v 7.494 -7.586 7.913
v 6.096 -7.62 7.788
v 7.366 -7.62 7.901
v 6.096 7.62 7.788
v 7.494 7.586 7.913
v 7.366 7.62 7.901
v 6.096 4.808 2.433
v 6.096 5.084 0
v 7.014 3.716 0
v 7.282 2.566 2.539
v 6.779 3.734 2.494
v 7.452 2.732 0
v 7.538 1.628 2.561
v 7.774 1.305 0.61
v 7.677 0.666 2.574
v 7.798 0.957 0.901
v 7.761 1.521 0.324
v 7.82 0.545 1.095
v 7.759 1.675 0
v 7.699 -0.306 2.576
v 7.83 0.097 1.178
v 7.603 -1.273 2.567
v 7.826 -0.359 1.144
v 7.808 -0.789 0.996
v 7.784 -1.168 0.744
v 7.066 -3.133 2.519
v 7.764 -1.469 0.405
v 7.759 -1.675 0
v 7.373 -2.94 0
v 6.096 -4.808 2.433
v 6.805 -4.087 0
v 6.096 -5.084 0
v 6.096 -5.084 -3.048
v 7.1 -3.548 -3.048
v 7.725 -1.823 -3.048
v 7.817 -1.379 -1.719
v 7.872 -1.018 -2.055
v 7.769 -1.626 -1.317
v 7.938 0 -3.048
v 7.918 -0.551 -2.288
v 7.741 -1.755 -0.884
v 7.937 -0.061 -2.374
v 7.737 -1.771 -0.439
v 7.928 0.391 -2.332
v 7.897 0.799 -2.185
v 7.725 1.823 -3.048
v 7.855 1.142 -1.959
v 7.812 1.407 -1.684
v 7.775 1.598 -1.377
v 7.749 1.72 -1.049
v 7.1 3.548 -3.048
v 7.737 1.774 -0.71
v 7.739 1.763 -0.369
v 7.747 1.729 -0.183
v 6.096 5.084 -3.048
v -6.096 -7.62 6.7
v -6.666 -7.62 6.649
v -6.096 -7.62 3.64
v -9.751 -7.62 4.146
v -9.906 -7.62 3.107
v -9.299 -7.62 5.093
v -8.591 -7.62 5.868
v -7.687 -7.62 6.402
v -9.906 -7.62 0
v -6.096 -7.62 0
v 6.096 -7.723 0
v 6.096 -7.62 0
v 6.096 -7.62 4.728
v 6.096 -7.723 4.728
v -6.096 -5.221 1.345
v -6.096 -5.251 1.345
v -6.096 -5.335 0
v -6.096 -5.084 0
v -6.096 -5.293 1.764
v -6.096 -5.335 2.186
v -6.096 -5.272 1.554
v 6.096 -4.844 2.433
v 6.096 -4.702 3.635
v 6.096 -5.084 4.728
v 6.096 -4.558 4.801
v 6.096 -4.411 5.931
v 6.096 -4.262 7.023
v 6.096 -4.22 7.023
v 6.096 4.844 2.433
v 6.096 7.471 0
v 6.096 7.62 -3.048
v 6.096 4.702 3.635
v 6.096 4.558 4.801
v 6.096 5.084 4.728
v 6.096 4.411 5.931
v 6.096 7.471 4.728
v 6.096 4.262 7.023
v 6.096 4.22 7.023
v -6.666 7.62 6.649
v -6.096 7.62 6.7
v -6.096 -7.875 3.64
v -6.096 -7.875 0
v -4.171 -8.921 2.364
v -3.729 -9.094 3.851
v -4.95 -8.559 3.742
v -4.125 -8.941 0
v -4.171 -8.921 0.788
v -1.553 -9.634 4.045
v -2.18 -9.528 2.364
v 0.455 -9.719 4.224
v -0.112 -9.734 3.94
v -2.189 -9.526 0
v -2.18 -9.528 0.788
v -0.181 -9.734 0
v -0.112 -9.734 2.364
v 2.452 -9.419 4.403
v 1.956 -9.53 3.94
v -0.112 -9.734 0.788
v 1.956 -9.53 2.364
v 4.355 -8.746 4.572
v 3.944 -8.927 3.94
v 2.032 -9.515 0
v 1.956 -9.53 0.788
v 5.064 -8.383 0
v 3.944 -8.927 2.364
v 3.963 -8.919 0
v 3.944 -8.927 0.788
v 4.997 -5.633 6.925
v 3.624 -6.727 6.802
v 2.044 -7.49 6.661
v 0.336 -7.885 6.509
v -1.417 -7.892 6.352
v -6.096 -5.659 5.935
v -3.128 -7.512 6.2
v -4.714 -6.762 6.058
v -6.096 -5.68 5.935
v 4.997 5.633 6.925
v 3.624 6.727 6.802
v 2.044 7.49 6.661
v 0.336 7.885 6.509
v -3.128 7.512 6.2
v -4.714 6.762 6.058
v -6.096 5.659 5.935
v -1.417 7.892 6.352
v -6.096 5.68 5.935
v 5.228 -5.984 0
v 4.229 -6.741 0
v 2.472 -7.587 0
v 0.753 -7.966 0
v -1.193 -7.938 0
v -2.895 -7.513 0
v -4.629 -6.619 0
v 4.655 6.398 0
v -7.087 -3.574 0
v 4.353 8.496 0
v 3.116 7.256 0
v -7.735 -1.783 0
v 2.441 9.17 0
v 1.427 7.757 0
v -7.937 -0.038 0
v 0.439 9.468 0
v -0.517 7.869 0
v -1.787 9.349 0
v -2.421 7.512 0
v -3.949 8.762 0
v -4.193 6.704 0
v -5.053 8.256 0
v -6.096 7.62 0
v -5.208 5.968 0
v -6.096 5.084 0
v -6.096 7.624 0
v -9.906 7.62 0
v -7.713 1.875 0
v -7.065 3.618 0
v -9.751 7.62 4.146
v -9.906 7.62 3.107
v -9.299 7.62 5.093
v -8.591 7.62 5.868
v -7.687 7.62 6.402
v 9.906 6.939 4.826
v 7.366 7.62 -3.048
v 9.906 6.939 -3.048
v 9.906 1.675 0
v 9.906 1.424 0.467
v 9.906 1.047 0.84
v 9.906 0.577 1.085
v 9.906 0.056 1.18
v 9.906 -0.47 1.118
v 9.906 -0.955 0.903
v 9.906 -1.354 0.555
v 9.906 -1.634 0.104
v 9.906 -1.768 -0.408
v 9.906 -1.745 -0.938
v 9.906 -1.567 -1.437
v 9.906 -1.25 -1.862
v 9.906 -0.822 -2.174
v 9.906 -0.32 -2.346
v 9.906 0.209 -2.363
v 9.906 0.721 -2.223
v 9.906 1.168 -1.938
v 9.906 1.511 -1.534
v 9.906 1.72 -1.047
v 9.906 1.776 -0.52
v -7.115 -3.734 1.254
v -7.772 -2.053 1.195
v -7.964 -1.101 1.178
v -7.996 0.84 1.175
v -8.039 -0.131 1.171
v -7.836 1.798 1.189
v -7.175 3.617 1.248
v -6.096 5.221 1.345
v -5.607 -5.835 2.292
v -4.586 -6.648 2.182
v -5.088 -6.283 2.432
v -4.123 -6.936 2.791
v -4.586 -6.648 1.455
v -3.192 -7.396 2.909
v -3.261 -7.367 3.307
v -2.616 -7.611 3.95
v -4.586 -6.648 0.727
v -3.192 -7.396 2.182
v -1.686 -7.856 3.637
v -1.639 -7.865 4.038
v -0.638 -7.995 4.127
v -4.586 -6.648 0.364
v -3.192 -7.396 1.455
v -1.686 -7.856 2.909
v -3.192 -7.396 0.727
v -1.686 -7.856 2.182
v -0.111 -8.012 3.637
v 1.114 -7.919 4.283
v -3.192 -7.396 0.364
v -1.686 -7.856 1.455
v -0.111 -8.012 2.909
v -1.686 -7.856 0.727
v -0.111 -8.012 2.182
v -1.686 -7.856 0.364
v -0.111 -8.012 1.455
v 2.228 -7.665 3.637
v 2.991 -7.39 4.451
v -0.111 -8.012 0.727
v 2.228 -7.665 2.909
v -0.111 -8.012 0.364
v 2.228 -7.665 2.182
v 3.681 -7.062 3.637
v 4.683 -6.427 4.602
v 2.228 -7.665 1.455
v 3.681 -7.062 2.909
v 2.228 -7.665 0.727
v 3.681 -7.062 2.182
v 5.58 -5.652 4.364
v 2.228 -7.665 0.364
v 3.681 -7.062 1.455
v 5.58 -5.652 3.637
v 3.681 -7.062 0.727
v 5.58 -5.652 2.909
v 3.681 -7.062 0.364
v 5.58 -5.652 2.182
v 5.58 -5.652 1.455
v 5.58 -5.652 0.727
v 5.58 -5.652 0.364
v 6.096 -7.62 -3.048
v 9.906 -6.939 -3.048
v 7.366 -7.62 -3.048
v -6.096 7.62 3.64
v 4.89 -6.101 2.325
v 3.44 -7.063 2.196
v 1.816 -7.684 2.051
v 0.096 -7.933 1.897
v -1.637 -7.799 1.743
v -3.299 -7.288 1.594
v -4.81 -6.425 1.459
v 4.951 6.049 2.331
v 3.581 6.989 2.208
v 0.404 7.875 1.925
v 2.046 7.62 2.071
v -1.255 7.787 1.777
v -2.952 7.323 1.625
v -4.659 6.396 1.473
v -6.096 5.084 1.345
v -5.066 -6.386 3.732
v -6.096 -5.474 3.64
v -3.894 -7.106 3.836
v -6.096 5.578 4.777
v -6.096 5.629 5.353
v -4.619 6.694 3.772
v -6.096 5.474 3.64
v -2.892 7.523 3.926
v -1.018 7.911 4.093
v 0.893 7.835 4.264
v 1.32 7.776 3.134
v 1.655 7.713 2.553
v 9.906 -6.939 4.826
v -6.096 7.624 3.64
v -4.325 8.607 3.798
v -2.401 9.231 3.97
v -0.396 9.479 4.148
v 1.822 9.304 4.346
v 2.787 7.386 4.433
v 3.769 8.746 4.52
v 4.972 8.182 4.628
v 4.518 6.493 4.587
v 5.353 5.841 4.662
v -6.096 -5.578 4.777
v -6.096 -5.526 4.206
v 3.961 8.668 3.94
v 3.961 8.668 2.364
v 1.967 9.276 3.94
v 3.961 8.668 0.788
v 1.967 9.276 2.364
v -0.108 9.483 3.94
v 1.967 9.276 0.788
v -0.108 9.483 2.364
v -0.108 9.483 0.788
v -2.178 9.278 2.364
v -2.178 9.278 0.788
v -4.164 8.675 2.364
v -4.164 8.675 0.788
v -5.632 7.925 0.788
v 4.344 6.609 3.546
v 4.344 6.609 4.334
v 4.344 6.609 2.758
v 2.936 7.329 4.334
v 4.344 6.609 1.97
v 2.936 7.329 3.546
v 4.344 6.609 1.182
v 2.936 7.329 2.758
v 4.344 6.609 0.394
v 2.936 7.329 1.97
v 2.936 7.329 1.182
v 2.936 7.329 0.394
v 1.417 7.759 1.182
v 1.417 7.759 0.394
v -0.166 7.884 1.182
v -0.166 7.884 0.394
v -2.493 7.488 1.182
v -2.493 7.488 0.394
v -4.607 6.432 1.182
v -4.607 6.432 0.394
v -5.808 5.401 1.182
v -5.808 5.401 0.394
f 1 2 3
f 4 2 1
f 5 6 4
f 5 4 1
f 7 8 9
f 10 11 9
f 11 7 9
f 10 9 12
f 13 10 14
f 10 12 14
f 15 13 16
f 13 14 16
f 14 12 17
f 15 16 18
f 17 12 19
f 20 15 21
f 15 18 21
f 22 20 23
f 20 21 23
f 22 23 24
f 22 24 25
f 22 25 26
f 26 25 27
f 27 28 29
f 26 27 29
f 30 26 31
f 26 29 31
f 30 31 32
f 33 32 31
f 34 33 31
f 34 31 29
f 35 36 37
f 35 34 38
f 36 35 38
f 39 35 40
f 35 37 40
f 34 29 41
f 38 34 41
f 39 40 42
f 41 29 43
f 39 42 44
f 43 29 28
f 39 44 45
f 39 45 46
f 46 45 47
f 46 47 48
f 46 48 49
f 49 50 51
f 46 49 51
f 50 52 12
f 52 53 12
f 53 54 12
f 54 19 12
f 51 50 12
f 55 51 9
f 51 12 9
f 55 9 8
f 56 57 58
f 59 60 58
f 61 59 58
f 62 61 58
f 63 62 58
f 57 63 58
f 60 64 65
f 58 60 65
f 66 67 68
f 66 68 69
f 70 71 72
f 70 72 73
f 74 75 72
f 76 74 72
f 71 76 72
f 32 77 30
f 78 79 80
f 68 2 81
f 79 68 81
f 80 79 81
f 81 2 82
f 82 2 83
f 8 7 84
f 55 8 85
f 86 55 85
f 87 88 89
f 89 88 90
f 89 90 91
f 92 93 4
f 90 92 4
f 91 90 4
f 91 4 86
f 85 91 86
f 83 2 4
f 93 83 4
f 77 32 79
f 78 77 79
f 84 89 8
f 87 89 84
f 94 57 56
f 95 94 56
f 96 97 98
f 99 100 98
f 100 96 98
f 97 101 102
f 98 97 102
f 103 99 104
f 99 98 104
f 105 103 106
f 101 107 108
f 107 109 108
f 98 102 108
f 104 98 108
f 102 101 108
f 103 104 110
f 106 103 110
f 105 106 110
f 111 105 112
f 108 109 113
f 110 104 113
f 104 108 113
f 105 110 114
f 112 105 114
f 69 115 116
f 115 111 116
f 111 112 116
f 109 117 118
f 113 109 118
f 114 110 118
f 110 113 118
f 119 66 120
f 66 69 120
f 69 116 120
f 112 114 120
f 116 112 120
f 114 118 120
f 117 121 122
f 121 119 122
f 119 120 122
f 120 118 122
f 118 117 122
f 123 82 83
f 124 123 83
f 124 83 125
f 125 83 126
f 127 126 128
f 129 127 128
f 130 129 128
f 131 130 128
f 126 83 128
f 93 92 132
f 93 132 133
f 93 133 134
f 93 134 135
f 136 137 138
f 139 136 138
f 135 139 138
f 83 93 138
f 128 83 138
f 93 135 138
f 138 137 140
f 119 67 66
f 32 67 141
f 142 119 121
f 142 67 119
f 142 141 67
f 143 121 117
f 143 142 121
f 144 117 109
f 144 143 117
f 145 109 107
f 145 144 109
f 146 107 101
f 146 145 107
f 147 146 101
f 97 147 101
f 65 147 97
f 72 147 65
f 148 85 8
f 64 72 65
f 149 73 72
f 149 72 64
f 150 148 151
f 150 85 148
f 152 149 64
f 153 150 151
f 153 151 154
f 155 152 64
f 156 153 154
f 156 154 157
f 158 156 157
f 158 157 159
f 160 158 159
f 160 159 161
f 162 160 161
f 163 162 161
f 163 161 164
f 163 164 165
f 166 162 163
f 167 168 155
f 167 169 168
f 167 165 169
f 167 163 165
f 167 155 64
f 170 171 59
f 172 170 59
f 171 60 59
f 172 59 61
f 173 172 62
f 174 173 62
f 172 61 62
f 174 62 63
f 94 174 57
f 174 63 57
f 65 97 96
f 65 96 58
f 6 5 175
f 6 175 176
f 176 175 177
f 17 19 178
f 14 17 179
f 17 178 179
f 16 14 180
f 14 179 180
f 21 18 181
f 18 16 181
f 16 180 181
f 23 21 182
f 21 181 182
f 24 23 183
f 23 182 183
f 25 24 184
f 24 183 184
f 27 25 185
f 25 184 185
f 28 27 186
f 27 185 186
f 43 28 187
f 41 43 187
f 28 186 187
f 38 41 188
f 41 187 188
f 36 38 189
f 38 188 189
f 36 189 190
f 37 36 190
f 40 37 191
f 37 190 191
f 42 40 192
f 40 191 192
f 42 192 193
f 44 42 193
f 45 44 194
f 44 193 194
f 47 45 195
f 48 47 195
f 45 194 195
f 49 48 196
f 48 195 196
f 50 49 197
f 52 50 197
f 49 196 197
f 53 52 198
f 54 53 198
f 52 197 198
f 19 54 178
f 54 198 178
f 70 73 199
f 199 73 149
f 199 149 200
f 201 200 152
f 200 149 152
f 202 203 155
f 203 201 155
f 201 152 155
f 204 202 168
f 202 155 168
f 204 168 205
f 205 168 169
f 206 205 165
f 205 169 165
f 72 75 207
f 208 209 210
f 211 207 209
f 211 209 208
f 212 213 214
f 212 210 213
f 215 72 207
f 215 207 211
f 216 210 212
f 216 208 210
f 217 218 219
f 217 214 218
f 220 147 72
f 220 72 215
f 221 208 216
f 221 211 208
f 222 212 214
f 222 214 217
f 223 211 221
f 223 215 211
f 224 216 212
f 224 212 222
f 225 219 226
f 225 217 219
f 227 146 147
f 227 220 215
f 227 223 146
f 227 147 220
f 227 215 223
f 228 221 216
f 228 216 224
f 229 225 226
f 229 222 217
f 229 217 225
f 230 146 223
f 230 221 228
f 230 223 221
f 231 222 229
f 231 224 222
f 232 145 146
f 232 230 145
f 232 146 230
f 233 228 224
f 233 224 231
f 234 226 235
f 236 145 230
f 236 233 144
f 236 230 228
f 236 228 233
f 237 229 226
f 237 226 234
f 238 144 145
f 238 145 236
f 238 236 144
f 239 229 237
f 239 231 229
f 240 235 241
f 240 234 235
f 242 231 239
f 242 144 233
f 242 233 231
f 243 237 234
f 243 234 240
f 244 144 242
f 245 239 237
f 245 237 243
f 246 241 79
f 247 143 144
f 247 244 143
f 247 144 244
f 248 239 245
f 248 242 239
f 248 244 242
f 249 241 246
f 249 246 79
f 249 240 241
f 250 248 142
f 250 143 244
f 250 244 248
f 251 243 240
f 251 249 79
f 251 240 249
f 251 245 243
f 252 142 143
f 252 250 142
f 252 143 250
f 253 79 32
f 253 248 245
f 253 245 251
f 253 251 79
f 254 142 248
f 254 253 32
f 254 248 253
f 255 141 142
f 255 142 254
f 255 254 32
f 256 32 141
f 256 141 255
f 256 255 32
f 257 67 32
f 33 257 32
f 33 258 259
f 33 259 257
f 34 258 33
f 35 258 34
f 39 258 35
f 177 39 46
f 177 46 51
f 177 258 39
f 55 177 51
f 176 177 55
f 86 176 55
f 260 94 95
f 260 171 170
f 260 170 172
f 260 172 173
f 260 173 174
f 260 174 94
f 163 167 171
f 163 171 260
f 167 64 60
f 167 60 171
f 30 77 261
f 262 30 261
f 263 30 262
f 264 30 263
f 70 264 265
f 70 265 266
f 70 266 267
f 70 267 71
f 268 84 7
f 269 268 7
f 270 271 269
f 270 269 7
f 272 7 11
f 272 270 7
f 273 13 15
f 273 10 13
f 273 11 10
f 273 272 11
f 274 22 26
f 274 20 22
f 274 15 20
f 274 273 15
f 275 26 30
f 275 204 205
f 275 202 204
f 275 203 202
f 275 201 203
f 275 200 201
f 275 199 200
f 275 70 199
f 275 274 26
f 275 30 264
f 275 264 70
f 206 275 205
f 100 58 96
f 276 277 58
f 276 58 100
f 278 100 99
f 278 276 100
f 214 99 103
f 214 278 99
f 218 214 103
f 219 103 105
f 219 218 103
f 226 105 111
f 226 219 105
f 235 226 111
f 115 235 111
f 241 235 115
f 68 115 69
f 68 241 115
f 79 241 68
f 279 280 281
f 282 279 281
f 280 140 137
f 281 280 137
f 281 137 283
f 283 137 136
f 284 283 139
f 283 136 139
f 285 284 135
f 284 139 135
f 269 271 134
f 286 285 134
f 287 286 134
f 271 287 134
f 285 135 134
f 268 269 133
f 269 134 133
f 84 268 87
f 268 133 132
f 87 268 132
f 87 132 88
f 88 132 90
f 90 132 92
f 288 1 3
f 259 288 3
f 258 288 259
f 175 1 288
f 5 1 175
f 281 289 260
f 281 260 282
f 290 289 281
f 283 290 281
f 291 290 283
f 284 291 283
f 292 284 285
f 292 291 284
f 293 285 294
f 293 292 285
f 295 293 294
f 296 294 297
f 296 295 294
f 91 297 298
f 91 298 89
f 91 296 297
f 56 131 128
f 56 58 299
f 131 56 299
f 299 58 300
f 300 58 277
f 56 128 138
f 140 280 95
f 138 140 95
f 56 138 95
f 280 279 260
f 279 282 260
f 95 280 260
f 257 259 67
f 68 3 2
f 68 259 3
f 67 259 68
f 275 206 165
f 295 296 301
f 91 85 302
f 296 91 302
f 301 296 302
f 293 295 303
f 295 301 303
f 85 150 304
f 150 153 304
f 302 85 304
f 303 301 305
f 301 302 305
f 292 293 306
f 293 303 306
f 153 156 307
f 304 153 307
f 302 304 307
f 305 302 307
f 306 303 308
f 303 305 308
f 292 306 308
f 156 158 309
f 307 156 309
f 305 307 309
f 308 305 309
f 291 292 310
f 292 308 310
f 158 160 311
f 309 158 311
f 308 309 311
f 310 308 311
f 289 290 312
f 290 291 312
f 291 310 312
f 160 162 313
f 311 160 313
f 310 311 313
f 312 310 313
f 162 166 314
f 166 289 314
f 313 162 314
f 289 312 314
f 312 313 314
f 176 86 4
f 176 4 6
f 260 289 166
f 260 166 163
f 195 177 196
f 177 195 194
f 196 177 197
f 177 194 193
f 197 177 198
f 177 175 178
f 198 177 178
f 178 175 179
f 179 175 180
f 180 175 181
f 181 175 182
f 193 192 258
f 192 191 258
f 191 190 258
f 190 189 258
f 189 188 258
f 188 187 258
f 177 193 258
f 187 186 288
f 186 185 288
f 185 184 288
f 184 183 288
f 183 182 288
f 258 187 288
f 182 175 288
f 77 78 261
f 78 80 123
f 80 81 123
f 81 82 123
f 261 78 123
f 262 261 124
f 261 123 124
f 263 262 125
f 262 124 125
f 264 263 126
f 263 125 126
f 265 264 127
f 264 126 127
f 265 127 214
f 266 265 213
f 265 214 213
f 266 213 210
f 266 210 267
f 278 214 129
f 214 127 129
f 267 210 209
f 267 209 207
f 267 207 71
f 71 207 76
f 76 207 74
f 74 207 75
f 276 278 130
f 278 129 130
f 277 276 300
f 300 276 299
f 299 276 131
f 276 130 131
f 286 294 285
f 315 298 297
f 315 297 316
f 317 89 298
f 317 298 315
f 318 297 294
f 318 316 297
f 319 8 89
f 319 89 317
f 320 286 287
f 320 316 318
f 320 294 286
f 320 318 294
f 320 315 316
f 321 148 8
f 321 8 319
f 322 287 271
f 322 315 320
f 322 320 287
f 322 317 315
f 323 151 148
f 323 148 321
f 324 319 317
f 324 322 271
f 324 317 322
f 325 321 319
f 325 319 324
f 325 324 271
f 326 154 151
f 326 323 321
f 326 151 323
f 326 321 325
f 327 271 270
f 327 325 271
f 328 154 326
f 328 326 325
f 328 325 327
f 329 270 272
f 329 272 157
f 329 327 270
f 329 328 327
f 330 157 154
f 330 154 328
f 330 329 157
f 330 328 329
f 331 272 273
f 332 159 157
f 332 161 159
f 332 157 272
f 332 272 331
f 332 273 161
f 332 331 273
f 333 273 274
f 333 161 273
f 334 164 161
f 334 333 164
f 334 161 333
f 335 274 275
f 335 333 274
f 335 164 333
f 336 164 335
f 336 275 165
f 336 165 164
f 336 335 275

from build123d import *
from OCP.BRepFilletAPI import BRepFilletAPI_MakeChamfer

# Parameters (mm, degrees)
SKETCH1_W                         = 3.81
SKETCH1_H                         = 15.24
BOSS_EXTRUDE1_DEPTH               = 8.128
BOSS_EXTRUDE1_2_DEPTH             = 8.128
CUT_EXTRUDE2_DEPTH                = 20.911072799
SKETCH12_R                        = 7.9375
MAGNET_DEPTH                      = 4.572
BOSS_EXTRUDE6_DEPTH               = 3.048
SKETCH14_R                        = 1.778
CUT_EXTRUDE4_DEPTH                = 2.54
CHAMFER3_SIZE                     = 2.54
CHAMFER3_SIZE2                    = 0.680590949
CHAMFER4_SIZE                     = 2.54
CHAMFER4_SIZE2                    = 0.680590949
CHAMFER5_SIZE                     = 3.302
CHAMFER5_SIZE2                    = 2.421231652
BOSS_EXTRUDE7_REACH               = 20.006
BOSS_EXTRUDE7_OFFSET_FROM_SURFACE = 3.048
FILLET1_R                         = 3.556


with BuildPart() as part:
    # Sketch1 → Boss-Extrude1 (new body)
    with BuildSketch(Plane.XY):
        with Locations((-8.001, 0)):
            Rectangle(SKETCH1_W, SKETCH1_H)
    extrude(amount=BOSS_EXTRUDE1_DEPTH)


with BuildPart() as body_2:
    # Sketch1 → Boss-Extrude1 2 (new body)
    with BuildSketch(Plane.XY):
        with Locations((8.001, 0)):
            Rectangle(SKETCH1_W, SKETCH1_H)
    extrude(amount=BOSS_EXTRUDE1_2_DEPTH)


with BuildPart() as cut_extrude2_tool:
    # Sketch6 → Cut-Extrude2 (new, through all)
    with BuildSketch(Plane(origin=(0, 7.62, 0), x_dir=(1, 0, 0), z_dir=(0, 1, 0))):
        Polygon((-9.906, -6.359826106), (9.906, -8.128), (-9.906, -8.128), align=None)
    extrude(amount=-CUT_EXTRUDE2_DEPTH)


with BuildPart() as part_1:
    add(part.part)

    # Cut-Extrude2: cut by cut_extrude2_tool
    add(cut_extrude2_tool.part, mode=Mode.SUBTRACT)

    # Cut-Loft1: read off the stored shape, not the designer's step
    # Cut-Loft1: loft between two sections, ruled curve by curve
    cut_loft1_from = [
        Edge.make_bspline([(-0.341139785, 7.934039191, 6.44843844), (15.401545931, 7.465303163, 7.853435709), (14.936513948, -8.402775219, 7.811932711), (-0.806171769, -7.934039191, 6.406935441), (-16.548857485, -7.465303163, 5.001938171), (-16.083825501, 8.402775219, 5.04344117), (-0.341139785, 7.934039191, 6.44843844)], [0, 0, 0, 0, 0.5, 0.5, 0.5, 1, 1, 1, 1], 3, [1, 0.333333333, 0.333333333, 1, 0.333333333, 0.333333333, 1]),
    ]
    cut_loft1_to = [
        Edge.make_bspline([(-0.164568393, 7.935793816, 0), (15.70701924, 8.264930602, 0), (16.036156025, -7.606657031, 0), (0.164568393, -7.935793816, 0), (-15.70701924, -8.264930602, 0), (-16.036156025, 7.606657031, 0), (-0.164568393, 7.935793816, 0)], [0, 0, 0, 0, 0.5, 0.5, 0.5, 1, 1, 1, 1], 3, [1, 0.333333333, 0.333333333, 1, 0.333333333, 0.333333333, 1]),
    ]
    cut_loft1 = Solid(Shell([*[Face.make_surface_from_curves(cut_loft1_from[k], cut_loft1_to[k]) for k in range(1)], Face(Wire(cut_loft1_from)), Face(Wire(cut_loft1_to))]))
    add(cut_loft1, mode=Mode.SUBTRACT)


with BuildPart() as body_2_1:
    add(body_2.part)

    # Cut-Extrude2: cut by cut_extrude2_tool
    add(cut_extrude2_tool.part, mode=Mode.SUBTRACT)

    # Cut-Loft1 2: loft between two sections, ruled curve by curve
    cut_loft1_2_from = [
        Edge.make_bspline([(-0.341139785, 7.934039191, 6.44843844), (15.401545931, 7.465303163, 7.853435709), (14.936513948, -8.402775219, 7.811932711), (-0.806171769, -7.934039191, 6.406935441), (-16.548857485, -7.465303163, 5.001938171), (-16.083825501, 8.402775219, 5.04344117), (-0.341139785, 7.934039191, 6.44843844)], [0, 0, 0, 0, 0.5, 0.5, 0.5, 1, 1, 1, 1], 3, [1, 0.333333333, 0.333333333, 1, 0.333333333, 0.333333333, 1]),
    ]
    cut_loft1_2_to = [
        Edge.make_bspline([(-0.164568393, 7.935793816, 0), (15.70701924, 8.264930602, 0), (16.036156025, -7.606657031, 0), (0.164568393, -7.935793816, 0), (-15.70701924, -8.264930602, 0), (-16.036156025, 7.606657031, 0), (-0.164568393, 7.935793816, 0)], [0, 0, 0, 0, 0.5, 0.5, 0.5, 1, 1, 1, 1], 3, [1, 0.333333333, 0.333333333, 1, 0.333333333, 0.333333333, 1]),
    ]
    cut_loft1_2 = Solid(Shell([*[Face.make_surface_from_curves(cut_loft1_2_from[k], cut_loft1_2_to[k]) for k in range(1)], Face(Wire(cut_loft1_2_from)), Face(Wire(cut_loft1_2_to))]))
    add(cut_loft1_2, mode=Mode.SUBTRACT)


with BuildPart() as body_3:
    # Sketch12 → Magnet (new body)
    with BuildSketch(Plane(origin=(-0.573655777, 0, 6.42768694), x_dir=(-0.9960410654107703, 0, -0.08889429686643446), z_dir=(0.08889429686643446, 0, -0.9960410654107703))):
        Circle(SKETCH12_R)
    extrude(amount=MAGNET_DEPTH)


with BuildPart() as body_4:
    # Sketch13 → Boss-Extrude6 (new body)
    with BuildSketch(Plane(origin=(0, 0, 0), x_dir=(-1, 0, 0), z_dir=(0, 0, -1))):
        with BuildLine():
            Line((-6.096, 5.08357062), (-6.096, 7.62))
            Line((-6.096, 7.62), (-9.906, 7.62))
            Line((-9.906, 7.62), (-9.906, -7.62))
            Line((-9.906, -7.62), (-6.096, -7.62))
            Line((-6.096, -7.62), (-6.096, -5.08357062))
            ThreePointArc((-6.096, -5.08357062), (-7.9375, 0), (-6.096, 5.08357062))
        make_face()
    extrude(amount=BOSS_EXTRUDE6_DEPTH)


with BuildPart() as cut_extrude4_tool:
    # Sketch14 → Cut-Extrude4 (new body)
    with BuildSketch(Plane(origin=(9.906, 0, 0), x_dir=(0, 0, -1), z_dir=(1, 0, 0))):
        with Locations((0.597062067, -1.1e-08)):
            Circle(SKETCH14_R)
    extrude(amount=-CUT_EXTRUDE4_DEPTH)


with BuildPart() as body_2_2:
    add(body_2_1.part)

    # Cut-Extrude4: cut by cut_extrude4_tool
    add(cut_extrude4_tool.part, mode=Mode.SUBTRACT)

    # Chamfer3: one chamfer whose edges measure the first distance from different faces: ONE call of the kernel's chamfer builder (chamfer() names one face for all edges)
    chamfer3_edges_1 = [body_2_2.edges().sort_by_distance(p)[0] for p in [
        (9.906, -7.62, 4.064),
    ]]
    chamfer3_side_1 = [body_2_2.faces().sort_by_distance(p)[0] for p in [
        (8.014566329, -7.62, 3.979597021),
    ]]
    chamfer3_edges_2 = [body_2_2.edges().sort_by_distance(p)[0] for p in [
        (9.906, 7.62, 4.064),
    ]]
    chamfer3_side_2 = [body_2_2.faces().sort_by_distance(p)[0] for p in [
        (8.014566329, 7.62, 3.979597021),
    ]]
    chamfer3 = BRepFilletAPI_MakeChamfer(body_2_2.part.solid().wrapped)
    for e in chamfer3_edges_1:
        chamfer3.Add(CHAMFER3_SIZE, CHAMFER3_SIZE2, e.wrapped, chamfer3_side_1[0].wrapped)  # the first distance lies on this face
    for e in chamfer3_edges_2:
        chamfer3.Add(CHAMFER3_SIZE, CHAMFER3_SIZE2, e.wrapped, chamfer3_side_2[0].wrapped)  # the first distance lies on this face
    add(Compound.cast(chamfer3.Shape()), mode=Mode.REPLACE)

    # Chamfer5
    chamfer5_edges = [body_2_2.edges().sort_by_distance(p)[0] for p in [
        (9.906, 0, 8.128),
    ]]
    chamfer5_side = [body_2_2.faces().sort_by_distance(p)[0] for p in [
        (9.906, 0, 4.157766254),
    ]]
    chamfer(chamfer5_edges, length=CHAMFER5_SIZE, length2=CHAMFER5_SIZE2, reference=chamfer5_side[0])

    # Boss-Extrude7: up to this face of the body (flat: up to its plane, moved by the offset)
    boss_extrude7_end = Plane(body_2_2.part.faces().sort_by_distance((6.795040928, 0, 7.8503543))[0]).offset(-BOSS_EXTRUDE7_OFFSET_FROM_SURFACE)
    # Sketch15 → Boss-Extrude7 (add, up to the picked face)
    with BuildSketch(Plane.XY, mode=Mode.PRIVATE) as boss_extrude7_sk1:
        with BuildLine():
            Line((6.096, 5.08357062), (6.096, 7.471449808))
            add(Edge.make_bspline(
                [(6.096, 7.471449808), (5.930756217, 7.591123534), (5.255615528, 8.051037173), (3.293003266, 9.079390192), (1.283010021, 9.48240548), (-0.107834445, 9.483073279), (-1.498678912, 9.483741079), (-3.43762918, 9.094971238), (-5.325260948, 8.130204629), (-5.94396227, 7.728072028), (-6.096, 7.623571521)],
                knots=[0.900690867, 0.900690867, 0.900690867, 0.900690867, 0.909893147, 0.9375, 1, 1, 1, 1.0625, 1.087339124, 1.095618826, 1.095618826, 1.095618826, 1.095618826], degree=3))
            Line((-6.096, 7.623571521), (-6.096001081, 5.083571521))
            add(Edge.make_bspline(
                [(6.096, 5.08357062), (5.93161291, 5.274891544), (5.758408134, 5.458513784), (5.199745975, 5.997244915), (4.788453523, 6.323024277), (4.121406265, 6.751856672), (3.889862409, 6.885002693), (3.419802681, 7.125246454), (3.180186729, 7.23314886), (2.447832586, 7.520869047), (1.940077624, 7.665345536), (0.893913787, 7.852965093), (0.366394093, 7.894488776), (-0.165582558, 7.883517088), (-0.697559209, 7.8725454), (-1.219532269, 7.809382621), (-1.988103649, 7.639571774), (-2.241878196, 7.570363771), (-2.744485351, 7.406164502), (-2.993938175, 7.310744438), (-3.718584086, 6.991700252), (-4.175623921, 6.734186385), (-5.038069326, 6.130349805), (-5.444832888, 5.781030811), (-5.906820855, 5.29786321), (-6.002858614, 5.191954979), (-6.096001081, 5.083571521)],
                knots=[0.860122022, 0.860122022, 0.860122022, 0.860122022, 0.875, 0.875, 0.90625, 0.90625, 0.921875, 0.921875, 0.9375, 0.9375, 0.96875, 0.96875, 1, 1, 1, 1.03125, 1.03125, 1.046875, 1.046875, 1.0625, 1.0625, 1.09375, 1.09375, 1.125, 1.125, 1.133513625, 1.133513625, 1.133513625, 1.133513625], degree=3))
        make_face()
    boss_extrude7_tool1 = split(extrude(boss_extrude7_sk1.sketch, amount=BOSS_EXTRUDE7_REACH, mode=Mode.PRIVATE), bisect_by=boss_extrude7_end, keep=Keep.BOTH, mode=Mode.PRIVATE)
    # Sketch15 → Boss-Extrude7 (add, up to the picked face)
    with BuildSketch(Plane.XY, mode=Mode.PRIVATE) as boss_extrude7_sk2:
        with BuildLine():
            add(Edge.make_bspline(
                [(-6.096, -5.334665385), (-6.001608062, -5.440026559), (-5.904161756, -5.543205008), (-5.428535567, -6.020913198), (-5.021324344, -6.355746552), (-4.367831042, -6.794427859), (-4.142640685, -6.930176212), (-3.677224948, -7.180264747), (-3.435889004, -7.294952261), (-2.704038324, -7.599333248), (-2.202060233, -7.75220516), (-1.170288992, -7.959061026), (-0.636413301, -8.012110875), (0.415017809, -8.012485804), (0.937476738, -7.961532915), (1.716181401, -7.806841712), (1.975144289, -7.741886149), (2.479947756, -7.588440875), (2.974576658, -7.410991551), (3.449201256, -7.186347645), (3.913706318, -6.937829508), (4.141960005, -6.800903506), (4.803088275, -6.358194944), (5.208510395, -6.024190383), (5.760001551, -5.471897601), (5.932187446, -5.282339739), (6.096, -5.08357062)],
                knots=[1.366624359, 1.366624359, 1.366624359, 1.366624359, 1.375, 1.375, 1.40625, 1.40625, 1.421875, 1.421875, 1.4375, 1.4375, 1.46875, 1.46875, 1.5, 1.5, 1.53125, 1.53125, 1.546875, 1.546875, 1.5625, 1.578125, 1.578125, 1.59375, 1.59375, 1.625, 1.625, 1.640183323, 1.640183323, 1.640183323, 1.640183323], degree=3))
            Line((6.096, -5.08357062), (6.096, -7.72253105))
            add(Edge.make_bspline(
                [(-6.096, -7.874665385), (-5.811745982, -8.069955065), (-5.191368312, -8.452655749), (-3.271071363, -9.379610796), (-0.11139785, -10.010823197), (3.138794467, -9.363488053), (5.12304575, -8.377449625), (5.814796936, -7.926184012), (6.096, -7.72253105)],
                knots=[1.404521499, 1.404521499, 1.404521499, 1.404521499, 1.420146511, 1.4375, 1.5, 1.5625, 1.583974967, 1.599599961, 1.599599961, 1.599599961, 1.599599961], degree=3))
            Line((-6.096, -7.874665385), (-6.096, -5.334665385))
        make_face()
    boss_extrude7_tool2 = split(extrude(boss_extrude7_sk2.sketch, amount=BOSS_EXTRUDE7_REACH, mode=Mode.PRIVATE), bisect_by=boss_extrude7_end, keep=Keep.BOTH, mode=Mode.PRIVATE)

    add(part_1.part)  # Boss-Extrude7 merges part

    add(body_3.part)  # Boss-Extrude7 merges body 3


with BuildPart() as body_4_1:
    add(body_4.part)

    # Cut-Extrude4: cut by cut_extrude4_tool
    add(cut_extrude4_tool.part, mode=Mode.SUBTRACT)

    # Chamfer4: one chamfer whose edges measure the first distance from different faces: ONE call of the kernel's chamfer builder (chamfer() names one face for all edges)
    chamfer4_edges_1 = [body_4_1.edges().sort_by_distance(p)[0] for p in [
        (9.906, -7.62, -1.524),
    ]]
    chamfer4_side_1 = [body_4_1.faces().sort_by_distance(p)[0] for p in [
        (8.001, -7.62, -1.524),
    ]]
    chamfer4_edges_2 = [body_4_1.edges().sort_by_distance(p)[0] for p in [
        (9.906, 7.62, -1.524),
    ]]
    chamfer4_side_2 = [body_4_1.faces().sort_by_distance(p)[0] for p in [
        (8.001, 7.62, -1.524),
    ]]
    chamfer4 = BRepFilletAPI_MakeChamfer(body_4_1.part.solid().wrapped)
    for e in chamfer4_edges_1:
        chamfer4.Add(CHAMFER4_SIZE, CHAMFER4_SIZE2, e.wrapped, chamfer4_side_1[0].wrapped)  # the first distance lies on this face
    for e in chamfer4_edges_2:
        chamfer4.Add(CHAMFER4_SIZE, CHAMFER4_SIZE2, e.wrapped, chamfer4_side_2[0].wrapped)  # the first distance lies on this face
    add(Compound.cast(chamfer4.Shape()), mode=Mode.REPLACE)


with BuildPart() as body_2_3:
    add(body_2_2.part)

    add(body_4_1.part)  # Boss-Extrude7 merges body 4
    add(boss_extrude7_tool1.solids().sort_by(Axis((5.966385, 6.27751, 0), (0, 0, 1)))[0])
    add(boss_extrude7_tool2.solids().sort_by(Axis((0.034935, -8.049766, 0), (0, 0, 1)))[0])

    # Fillet1
    fillet1_edges = [body_2_3.edges().sort_by_distance(p)[0] for p in [
        (-9.906, 0, 6.359826106),
    ]]
    fillet(fillet1_edges, radius=FILLET1_R)


solid = body_2_3.part
